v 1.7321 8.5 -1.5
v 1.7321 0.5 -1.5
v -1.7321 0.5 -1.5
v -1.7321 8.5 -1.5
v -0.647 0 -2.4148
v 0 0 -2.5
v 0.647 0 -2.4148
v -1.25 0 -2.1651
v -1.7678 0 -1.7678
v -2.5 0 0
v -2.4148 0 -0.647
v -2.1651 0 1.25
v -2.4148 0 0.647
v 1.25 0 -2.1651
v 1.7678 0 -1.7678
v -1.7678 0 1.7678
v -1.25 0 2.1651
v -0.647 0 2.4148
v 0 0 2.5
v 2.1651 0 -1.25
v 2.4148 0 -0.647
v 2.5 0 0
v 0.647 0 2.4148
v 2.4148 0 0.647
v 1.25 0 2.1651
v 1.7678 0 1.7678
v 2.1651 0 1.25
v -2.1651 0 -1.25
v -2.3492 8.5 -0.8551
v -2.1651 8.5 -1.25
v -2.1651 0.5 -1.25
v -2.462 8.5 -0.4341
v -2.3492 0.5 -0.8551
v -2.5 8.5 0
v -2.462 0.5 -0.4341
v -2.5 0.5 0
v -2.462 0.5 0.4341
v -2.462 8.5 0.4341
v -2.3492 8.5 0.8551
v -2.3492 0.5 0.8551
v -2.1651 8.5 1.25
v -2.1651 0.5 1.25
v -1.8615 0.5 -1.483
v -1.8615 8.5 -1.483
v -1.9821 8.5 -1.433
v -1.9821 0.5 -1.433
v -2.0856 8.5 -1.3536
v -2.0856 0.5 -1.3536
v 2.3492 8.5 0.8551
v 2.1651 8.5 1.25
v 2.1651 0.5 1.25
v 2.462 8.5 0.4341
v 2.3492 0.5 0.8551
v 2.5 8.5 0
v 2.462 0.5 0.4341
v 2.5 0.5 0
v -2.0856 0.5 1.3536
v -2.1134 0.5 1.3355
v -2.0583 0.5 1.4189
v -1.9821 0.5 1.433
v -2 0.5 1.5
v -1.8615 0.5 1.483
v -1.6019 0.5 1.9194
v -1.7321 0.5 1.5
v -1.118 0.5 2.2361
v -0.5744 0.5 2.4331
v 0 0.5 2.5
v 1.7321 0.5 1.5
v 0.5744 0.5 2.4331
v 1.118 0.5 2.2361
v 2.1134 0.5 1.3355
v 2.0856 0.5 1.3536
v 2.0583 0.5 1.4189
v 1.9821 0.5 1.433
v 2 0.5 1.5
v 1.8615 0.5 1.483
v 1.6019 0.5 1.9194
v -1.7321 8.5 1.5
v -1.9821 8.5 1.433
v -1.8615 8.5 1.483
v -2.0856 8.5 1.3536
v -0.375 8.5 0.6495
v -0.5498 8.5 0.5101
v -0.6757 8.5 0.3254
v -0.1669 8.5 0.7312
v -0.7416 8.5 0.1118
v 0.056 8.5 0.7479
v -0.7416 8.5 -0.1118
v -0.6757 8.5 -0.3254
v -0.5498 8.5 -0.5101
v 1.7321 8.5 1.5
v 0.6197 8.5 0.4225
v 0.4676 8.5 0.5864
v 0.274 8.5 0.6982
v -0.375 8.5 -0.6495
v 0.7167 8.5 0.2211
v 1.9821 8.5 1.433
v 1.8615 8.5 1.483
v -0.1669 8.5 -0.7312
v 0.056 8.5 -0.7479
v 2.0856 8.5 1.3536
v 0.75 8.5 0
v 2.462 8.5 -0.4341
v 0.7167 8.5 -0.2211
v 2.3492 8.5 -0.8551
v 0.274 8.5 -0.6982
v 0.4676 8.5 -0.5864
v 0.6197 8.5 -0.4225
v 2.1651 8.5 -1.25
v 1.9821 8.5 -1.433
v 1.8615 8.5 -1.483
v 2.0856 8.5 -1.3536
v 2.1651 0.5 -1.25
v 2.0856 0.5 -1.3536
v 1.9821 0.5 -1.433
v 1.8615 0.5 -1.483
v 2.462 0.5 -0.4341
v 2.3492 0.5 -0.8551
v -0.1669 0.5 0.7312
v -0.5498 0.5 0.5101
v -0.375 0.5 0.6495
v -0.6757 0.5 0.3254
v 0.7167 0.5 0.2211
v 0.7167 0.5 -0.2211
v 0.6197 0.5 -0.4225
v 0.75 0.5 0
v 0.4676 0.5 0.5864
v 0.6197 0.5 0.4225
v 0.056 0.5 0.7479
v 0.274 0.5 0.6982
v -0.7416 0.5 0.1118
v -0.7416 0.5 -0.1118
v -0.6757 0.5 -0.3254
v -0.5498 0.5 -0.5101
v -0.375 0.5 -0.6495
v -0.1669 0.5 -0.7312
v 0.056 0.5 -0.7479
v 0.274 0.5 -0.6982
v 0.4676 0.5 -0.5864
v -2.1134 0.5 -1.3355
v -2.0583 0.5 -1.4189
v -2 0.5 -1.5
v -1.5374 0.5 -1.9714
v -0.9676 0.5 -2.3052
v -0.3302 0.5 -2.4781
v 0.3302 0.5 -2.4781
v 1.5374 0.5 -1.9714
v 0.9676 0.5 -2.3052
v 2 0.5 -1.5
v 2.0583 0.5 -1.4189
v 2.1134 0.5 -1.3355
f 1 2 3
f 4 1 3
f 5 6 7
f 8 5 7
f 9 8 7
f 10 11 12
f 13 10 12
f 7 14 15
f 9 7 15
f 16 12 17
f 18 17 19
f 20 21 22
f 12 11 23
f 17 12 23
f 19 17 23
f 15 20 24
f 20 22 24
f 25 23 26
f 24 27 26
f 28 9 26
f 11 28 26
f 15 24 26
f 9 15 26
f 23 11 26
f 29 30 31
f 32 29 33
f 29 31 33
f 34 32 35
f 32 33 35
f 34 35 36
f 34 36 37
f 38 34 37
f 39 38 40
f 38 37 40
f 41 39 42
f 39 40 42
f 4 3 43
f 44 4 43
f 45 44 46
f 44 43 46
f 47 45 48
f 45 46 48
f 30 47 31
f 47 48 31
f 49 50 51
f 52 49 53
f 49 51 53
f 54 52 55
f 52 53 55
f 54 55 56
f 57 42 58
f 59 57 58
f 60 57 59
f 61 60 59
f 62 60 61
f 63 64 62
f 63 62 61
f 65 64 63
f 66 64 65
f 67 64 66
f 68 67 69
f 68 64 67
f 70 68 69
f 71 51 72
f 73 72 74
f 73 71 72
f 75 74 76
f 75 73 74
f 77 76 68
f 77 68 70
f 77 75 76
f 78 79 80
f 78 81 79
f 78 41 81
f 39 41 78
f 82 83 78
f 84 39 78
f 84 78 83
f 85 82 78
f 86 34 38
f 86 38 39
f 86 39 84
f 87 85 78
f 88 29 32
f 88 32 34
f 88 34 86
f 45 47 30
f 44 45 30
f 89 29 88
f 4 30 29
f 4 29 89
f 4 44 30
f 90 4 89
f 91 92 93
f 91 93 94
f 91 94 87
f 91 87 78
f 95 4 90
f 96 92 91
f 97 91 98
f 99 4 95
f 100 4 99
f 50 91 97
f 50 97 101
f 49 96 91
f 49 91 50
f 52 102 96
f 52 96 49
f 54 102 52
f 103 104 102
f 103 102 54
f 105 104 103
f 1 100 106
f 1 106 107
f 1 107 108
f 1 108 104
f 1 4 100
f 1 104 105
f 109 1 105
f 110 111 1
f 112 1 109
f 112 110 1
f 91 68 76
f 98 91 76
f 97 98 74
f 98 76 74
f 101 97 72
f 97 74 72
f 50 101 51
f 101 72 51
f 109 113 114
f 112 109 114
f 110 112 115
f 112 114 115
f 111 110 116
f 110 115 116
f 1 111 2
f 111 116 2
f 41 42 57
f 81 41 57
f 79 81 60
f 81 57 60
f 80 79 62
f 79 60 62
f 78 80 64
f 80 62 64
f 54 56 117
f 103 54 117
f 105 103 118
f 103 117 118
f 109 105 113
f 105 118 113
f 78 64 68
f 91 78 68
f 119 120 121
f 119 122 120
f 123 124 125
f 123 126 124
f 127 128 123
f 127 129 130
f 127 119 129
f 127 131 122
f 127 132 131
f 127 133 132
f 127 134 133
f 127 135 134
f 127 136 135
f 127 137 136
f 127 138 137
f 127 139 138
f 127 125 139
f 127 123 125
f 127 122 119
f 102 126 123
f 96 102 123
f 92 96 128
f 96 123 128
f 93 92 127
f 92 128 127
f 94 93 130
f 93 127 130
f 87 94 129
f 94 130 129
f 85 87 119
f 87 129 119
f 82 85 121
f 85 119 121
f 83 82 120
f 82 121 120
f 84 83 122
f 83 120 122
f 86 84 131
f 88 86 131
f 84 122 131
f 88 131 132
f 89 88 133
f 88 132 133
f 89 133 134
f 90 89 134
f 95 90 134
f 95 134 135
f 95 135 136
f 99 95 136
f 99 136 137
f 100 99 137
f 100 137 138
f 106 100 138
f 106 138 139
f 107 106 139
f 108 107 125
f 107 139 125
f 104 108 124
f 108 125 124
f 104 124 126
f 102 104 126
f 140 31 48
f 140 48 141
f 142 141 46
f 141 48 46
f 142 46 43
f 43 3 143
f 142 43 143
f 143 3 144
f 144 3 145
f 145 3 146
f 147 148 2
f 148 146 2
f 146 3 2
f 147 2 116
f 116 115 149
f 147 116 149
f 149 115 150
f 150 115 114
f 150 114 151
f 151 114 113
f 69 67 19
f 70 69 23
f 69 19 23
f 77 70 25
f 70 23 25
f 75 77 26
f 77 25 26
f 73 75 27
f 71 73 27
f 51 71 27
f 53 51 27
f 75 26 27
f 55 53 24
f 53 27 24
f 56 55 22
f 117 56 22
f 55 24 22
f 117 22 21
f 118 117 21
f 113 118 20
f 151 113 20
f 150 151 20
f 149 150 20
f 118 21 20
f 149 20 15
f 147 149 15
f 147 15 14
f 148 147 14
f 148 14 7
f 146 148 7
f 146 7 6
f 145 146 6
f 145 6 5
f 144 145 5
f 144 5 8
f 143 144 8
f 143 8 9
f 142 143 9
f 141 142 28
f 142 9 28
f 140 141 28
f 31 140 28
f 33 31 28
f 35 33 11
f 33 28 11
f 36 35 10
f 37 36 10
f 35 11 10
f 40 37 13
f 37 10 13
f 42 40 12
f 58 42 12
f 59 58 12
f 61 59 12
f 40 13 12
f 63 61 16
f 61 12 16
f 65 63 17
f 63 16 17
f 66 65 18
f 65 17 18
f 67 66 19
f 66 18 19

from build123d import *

# Parameters (mm, degrees)
SKETCH2_R           = 2.5
BOSS_EXTRUDE1_DEPTH = 0.5
BOSS_EXTRUDE2_DEPTH = 8
FILLET1_R           = 0.5


with BuildPart() as part:
    # Sketch2 → Boss-Extrude1 (new body)
    with BuildSketch(Plane(origin=(0, 0, 0), x_dir=(1, 0, 0), z_dir=(0, 1, 0))):
        with Locations(Location((0, 0, 0), (0, 0, 270))):
            Circle(SKETCH2_R)
    extrude(amount=BOSS_EXTRUDE1_DEPTH)

    # Sketch3 → Boss-Extrude2 (add)
    with BuildSketch(Plane(origin=(0, 0.5, 0), x_dir=(1, 0, 0), z_dir=(0, 1, 0))):
        with BuildLine():
            Line((2, 1.5), (-2, 1.5))
            ThreePointArc((-2, 1.5), (-2.371708245, 0.790569415), (-2.5, 0))
            Line((-2.5, 0), (-0.75, 0))
            ThreePointArc((-0.75, 0), (0, 0.75), (0.75, 0))
            Line((0.75, 0), (2.5, 0))
            ThreePointArc((2.5, 0), (2.371708245, 0.790569415), (2, 1.5))
        make_face()
        with BuildLine():
            Line((-0.75, 0), (-2.5, 0))
            ThreePointArc((-2.5, 0), (-2.371708245, -0.790569415), (-2, -1.5))
            Line((-2, -1.5), (2, -1.5))
            ThreePointArc((2, -1.5), (2.371708245, -0.790569415), (2.5, 0))
            Line((2.5, 0), (0.75, 0))
            ThreePointArc((0.75, 0), (0, -0.75), (-0.75, 0))
        make_face()
    extrude(amount=BOSS_EXTRUDE2_DEPTH)

    # Fillet1
    # the kernel refuses this fillet: 0.5 mm, written as the material it takes off along each edge
    with BuildSketch(Plane(origin=(-2, 0.5, -1.5), x_dir=(-0.5509898714915042, 0, 0.8345119301206998), z_dir=(0, 1, 0)), Plane(origin=(2, 0.5, 1.5), x_dir=(0.5509898714915042, 0, -0.8345119301206998), z_dir=(0, 1, 0))) as fillet1_piece_1:
        with BuildLine():
            CenterArc((0.269618674, 0.499101733), FILLET1_R, 213.434948823, 60)
            Line((-0.147637291, 0.223606798), (0, 0))
            ThreePointArc((0, 0), (0.149788152, -0.004491333), (0.299576304, 0))
        make_face()
    extrude(amount=8.748940761, mode=Mode.SUBTRACT)
    with BuildSketch(Plane(origin=(2, 0.5, -1.5), x_dir=(0.5509898714915049, 0, 0.8345119301206994), z_dir=(0, 1, 0)), Plane(origin=(-2, 0.5, 1.5), x_dir=(-0.5509898714915045, 0, -0.8345119301206995), z_dir=(0, 1, 0))) as fillet1_piece_2:
        with BuildLine():
            CenterArc((0.269618674, -0.499101733), FILLET1_R, 86.565051177, 60)
            Line((-0.147637291, -0.223606798), (0, 0))
            ThreePointArc((0, 0), (0.149788152, 0.004491333), (0.299576304, 0))
        make_face()
    extrude(amount=8.748940761, mode=Mode.SUBTRACT)


solid = part.part
